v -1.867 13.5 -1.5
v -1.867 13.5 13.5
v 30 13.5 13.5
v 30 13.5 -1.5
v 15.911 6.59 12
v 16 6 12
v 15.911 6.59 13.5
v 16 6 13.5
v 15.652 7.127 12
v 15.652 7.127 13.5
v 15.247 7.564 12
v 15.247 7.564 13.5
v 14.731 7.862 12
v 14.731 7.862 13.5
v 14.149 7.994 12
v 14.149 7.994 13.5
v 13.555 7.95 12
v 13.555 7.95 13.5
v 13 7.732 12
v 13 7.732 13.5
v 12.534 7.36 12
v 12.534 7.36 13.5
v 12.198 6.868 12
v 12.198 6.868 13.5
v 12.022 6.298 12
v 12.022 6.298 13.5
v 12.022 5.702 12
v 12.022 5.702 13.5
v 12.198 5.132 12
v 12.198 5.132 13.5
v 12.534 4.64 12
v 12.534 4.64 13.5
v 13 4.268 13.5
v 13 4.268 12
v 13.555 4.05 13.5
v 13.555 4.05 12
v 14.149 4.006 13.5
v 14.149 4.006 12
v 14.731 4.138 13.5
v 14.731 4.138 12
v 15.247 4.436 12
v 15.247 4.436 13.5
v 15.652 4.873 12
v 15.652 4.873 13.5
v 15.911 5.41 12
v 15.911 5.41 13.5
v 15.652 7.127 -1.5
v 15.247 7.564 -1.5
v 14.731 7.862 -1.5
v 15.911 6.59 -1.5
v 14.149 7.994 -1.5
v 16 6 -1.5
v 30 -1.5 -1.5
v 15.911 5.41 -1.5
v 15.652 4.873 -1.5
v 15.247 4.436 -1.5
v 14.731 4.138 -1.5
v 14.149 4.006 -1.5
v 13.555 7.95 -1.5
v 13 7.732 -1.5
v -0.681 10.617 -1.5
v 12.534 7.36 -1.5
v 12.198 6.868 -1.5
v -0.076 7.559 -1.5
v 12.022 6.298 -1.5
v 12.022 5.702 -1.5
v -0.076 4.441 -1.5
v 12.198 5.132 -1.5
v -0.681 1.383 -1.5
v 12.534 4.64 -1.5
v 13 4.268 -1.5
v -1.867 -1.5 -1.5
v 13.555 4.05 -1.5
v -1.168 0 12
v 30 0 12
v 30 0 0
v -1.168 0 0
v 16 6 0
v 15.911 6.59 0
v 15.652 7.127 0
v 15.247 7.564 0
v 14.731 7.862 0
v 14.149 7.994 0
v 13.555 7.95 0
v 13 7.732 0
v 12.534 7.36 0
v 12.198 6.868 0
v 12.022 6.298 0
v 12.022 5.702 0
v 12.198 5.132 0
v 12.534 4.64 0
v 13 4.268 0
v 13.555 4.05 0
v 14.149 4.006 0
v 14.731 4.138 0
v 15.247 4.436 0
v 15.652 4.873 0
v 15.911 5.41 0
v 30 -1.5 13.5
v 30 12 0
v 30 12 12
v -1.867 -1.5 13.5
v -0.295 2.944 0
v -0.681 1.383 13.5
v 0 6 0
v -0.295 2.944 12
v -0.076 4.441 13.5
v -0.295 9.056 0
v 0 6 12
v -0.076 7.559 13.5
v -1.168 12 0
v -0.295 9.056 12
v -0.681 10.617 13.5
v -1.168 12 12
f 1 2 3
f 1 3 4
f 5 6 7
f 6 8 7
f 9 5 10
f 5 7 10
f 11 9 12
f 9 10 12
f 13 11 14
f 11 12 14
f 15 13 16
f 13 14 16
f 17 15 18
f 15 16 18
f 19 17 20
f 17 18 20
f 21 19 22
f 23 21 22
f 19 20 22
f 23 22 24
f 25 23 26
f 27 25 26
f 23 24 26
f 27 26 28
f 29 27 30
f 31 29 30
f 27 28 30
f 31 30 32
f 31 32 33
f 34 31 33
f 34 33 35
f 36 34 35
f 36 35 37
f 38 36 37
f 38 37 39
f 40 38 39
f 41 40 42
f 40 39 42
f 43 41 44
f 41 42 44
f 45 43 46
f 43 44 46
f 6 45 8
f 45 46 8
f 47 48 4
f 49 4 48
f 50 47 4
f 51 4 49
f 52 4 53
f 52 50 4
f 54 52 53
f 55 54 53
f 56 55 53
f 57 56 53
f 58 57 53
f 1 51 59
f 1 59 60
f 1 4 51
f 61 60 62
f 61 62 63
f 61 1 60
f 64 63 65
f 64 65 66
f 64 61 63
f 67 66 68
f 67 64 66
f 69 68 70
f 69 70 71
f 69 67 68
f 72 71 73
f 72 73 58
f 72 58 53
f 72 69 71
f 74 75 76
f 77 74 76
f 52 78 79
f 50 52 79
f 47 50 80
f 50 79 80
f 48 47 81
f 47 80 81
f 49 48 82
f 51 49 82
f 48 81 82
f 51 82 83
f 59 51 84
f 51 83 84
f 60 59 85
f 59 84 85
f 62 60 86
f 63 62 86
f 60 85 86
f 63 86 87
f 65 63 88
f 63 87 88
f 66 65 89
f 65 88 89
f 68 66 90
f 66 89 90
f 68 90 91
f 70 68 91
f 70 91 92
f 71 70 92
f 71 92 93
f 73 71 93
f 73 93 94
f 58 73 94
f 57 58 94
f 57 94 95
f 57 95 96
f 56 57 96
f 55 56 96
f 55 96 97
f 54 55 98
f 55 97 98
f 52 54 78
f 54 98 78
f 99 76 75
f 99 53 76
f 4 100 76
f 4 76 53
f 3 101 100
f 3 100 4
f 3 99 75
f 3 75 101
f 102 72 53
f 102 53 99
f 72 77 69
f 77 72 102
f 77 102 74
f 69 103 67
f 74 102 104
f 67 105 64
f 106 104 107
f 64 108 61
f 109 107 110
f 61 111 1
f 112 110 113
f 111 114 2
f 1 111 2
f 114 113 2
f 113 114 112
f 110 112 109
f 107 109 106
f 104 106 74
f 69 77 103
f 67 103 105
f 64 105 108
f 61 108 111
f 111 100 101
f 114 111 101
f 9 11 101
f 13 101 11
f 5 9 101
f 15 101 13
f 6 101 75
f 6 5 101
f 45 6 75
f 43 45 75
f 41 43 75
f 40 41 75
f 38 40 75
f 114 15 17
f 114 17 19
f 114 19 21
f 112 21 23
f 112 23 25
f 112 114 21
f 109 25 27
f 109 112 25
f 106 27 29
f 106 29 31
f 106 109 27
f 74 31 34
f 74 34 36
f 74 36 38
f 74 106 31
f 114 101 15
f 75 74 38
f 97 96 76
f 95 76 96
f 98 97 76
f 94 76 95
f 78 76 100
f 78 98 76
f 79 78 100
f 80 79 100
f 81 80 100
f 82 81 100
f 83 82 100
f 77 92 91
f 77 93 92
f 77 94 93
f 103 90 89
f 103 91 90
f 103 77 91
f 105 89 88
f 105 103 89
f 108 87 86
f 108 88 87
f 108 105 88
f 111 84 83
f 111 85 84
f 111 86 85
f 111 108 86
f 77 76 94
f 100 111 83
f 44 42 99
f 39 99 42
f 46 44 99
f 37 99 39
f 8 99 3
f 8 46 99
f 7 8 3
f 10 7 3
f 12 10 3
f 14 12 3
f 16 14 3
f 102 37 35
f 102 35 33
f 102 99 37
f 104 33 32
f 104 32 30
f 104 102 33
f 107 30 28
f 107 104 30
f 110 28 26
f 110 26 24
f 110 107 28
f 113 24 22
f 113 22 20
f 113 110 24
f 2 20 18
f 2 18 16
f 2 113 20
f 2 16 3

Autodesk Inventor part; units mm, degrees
ref_plane "YZ Plane" through (0, 0, 0) normal (1, 0, 0) x (0, 1, 0)
ref_plane "XZ Plane" through (0, 0, 0) normal (0, 1, 0) x (-1, 0, 0)
ref_plane "XY Plane" through (0, 0, 0) normal (0, 0, 1) x (1, 0, 0)
sketch "Sketch1" plane through (0, 0, 0) normal (1, 0, 0) x (0, 1, 0)
  line L0 (0, 0) -> (12, 0)
  line L1 (12, 0) -> (12, 12)
  line L2 (12, 12) -> (0, 12)
  line L3 (0, 12) -> (0, 0)
  line L4 (-1.5, 13.5) -> (13.5, 13.5)
  line L5 (13.5, 13.5) -> (13.5, -1.5)
  line L6 (13.5, -1.5) -> (-1.5, -1.5)
  line L7 (-1.5, -1.5) -> (-1.5, 13.5)
  dimension "d0" = 1.5
  dimension "d1" = 12
  dimension "d2" = 12
extrude "Extrusion1" add sketch "Sketch1" along normal blind 30 and the other way blind 15
sketch "Sketch2" plane through (0, -1.5, 13.5) normal (0, 0, 1) x (1, 0, 0)
  line L0 (0, 0) -> (0, 15) projected
  line L1 (0, 0) -> (30, 0) projected
  circle A0 centre (-16, 7.5) radius 16
  circle A1 centre (-16, 7.5) radius 30
  circle A2 centre (14, 7.5) radius 2
  point P0 (0, 1.5)
  dimension "d17" = 60
  dimension "d8" = 32
  dimension "d9" = 16
  dimension "d18" = 4
sketch "Sketch4" plane through (0, 0, 0) normal (-1, 0, 0) x (0, 0, 1)
  line L0 (0, 0) -> (12, 0)
  line L1 (12, 0) -> (12, 12)
  line L2 (12, 12) -> (0, 12)
  line L3 (0, 12) -> (0, 0)
  line L4 (-1.5, -1.5) -> (13.5, -1.5)
  line L5 (13.5, -1.5) -> (13.5, 13.5)
  line L6 (13.5, 13.5) -> (-1.5, 13.5)
  line L7 (-1.5, 13.5) -> (-1.5, -1.5)
extrude "Extrusion2" add sketch "Sketch4" along normal blind 10
extrude "Extrusion3" cut sketch "Sketch2" against normal through all contours A0
extrude "Extrusion4" cut sketch "Sketch2" along normal through all both and the other way through all contours A2 A1 | A1 A2 picked at (14.5954, 6.9828) picked at (13.3724, 7.0462)
equation "\"d0\" = ZártSzelvényFalVastagság"
equation "\"d1\" = ZártSzelvényBelsőÁtmérő"
equation "\"d2\" = ZártSzelvényBelsőÁtmérő"
equation "\"d17\" = 2 * PorvedoRogzitesJatekSugara"
equation "\"d8\" = CsapágyHázKülsőÁtmérő"
equation "\"d9\" = 0.5 * CsapágyHázKülsőÁtmérő"
equation "\"ZártSzelvényFalVastagság\" = 1.5"
equation "\"ZártSzelvényBelsőÁtmérő\" = 12"
equation "\"CsapágyHázKülsőÁtmérő\" = 32"
equation "\"ZártSzelvényKülsőÁtmérő\" = 15"
equation "\"CsapágyBelsőÁtmérő\" = 12"
equation "\"CsapágyKülsőÁtmérő\" = 28"
equation "\"CsapágyHázBelsőÁtmérő\" = 26"
equation "\"CsapágyHázHoszza\" = 45"
equation "\"CsapágySzélesége\" = 8"
equation "\"PorvedoRogzitesJatekSugara\" = 30"
properties part number "KétvégenMartSzelvény" material "Acetal Resin, Black"
